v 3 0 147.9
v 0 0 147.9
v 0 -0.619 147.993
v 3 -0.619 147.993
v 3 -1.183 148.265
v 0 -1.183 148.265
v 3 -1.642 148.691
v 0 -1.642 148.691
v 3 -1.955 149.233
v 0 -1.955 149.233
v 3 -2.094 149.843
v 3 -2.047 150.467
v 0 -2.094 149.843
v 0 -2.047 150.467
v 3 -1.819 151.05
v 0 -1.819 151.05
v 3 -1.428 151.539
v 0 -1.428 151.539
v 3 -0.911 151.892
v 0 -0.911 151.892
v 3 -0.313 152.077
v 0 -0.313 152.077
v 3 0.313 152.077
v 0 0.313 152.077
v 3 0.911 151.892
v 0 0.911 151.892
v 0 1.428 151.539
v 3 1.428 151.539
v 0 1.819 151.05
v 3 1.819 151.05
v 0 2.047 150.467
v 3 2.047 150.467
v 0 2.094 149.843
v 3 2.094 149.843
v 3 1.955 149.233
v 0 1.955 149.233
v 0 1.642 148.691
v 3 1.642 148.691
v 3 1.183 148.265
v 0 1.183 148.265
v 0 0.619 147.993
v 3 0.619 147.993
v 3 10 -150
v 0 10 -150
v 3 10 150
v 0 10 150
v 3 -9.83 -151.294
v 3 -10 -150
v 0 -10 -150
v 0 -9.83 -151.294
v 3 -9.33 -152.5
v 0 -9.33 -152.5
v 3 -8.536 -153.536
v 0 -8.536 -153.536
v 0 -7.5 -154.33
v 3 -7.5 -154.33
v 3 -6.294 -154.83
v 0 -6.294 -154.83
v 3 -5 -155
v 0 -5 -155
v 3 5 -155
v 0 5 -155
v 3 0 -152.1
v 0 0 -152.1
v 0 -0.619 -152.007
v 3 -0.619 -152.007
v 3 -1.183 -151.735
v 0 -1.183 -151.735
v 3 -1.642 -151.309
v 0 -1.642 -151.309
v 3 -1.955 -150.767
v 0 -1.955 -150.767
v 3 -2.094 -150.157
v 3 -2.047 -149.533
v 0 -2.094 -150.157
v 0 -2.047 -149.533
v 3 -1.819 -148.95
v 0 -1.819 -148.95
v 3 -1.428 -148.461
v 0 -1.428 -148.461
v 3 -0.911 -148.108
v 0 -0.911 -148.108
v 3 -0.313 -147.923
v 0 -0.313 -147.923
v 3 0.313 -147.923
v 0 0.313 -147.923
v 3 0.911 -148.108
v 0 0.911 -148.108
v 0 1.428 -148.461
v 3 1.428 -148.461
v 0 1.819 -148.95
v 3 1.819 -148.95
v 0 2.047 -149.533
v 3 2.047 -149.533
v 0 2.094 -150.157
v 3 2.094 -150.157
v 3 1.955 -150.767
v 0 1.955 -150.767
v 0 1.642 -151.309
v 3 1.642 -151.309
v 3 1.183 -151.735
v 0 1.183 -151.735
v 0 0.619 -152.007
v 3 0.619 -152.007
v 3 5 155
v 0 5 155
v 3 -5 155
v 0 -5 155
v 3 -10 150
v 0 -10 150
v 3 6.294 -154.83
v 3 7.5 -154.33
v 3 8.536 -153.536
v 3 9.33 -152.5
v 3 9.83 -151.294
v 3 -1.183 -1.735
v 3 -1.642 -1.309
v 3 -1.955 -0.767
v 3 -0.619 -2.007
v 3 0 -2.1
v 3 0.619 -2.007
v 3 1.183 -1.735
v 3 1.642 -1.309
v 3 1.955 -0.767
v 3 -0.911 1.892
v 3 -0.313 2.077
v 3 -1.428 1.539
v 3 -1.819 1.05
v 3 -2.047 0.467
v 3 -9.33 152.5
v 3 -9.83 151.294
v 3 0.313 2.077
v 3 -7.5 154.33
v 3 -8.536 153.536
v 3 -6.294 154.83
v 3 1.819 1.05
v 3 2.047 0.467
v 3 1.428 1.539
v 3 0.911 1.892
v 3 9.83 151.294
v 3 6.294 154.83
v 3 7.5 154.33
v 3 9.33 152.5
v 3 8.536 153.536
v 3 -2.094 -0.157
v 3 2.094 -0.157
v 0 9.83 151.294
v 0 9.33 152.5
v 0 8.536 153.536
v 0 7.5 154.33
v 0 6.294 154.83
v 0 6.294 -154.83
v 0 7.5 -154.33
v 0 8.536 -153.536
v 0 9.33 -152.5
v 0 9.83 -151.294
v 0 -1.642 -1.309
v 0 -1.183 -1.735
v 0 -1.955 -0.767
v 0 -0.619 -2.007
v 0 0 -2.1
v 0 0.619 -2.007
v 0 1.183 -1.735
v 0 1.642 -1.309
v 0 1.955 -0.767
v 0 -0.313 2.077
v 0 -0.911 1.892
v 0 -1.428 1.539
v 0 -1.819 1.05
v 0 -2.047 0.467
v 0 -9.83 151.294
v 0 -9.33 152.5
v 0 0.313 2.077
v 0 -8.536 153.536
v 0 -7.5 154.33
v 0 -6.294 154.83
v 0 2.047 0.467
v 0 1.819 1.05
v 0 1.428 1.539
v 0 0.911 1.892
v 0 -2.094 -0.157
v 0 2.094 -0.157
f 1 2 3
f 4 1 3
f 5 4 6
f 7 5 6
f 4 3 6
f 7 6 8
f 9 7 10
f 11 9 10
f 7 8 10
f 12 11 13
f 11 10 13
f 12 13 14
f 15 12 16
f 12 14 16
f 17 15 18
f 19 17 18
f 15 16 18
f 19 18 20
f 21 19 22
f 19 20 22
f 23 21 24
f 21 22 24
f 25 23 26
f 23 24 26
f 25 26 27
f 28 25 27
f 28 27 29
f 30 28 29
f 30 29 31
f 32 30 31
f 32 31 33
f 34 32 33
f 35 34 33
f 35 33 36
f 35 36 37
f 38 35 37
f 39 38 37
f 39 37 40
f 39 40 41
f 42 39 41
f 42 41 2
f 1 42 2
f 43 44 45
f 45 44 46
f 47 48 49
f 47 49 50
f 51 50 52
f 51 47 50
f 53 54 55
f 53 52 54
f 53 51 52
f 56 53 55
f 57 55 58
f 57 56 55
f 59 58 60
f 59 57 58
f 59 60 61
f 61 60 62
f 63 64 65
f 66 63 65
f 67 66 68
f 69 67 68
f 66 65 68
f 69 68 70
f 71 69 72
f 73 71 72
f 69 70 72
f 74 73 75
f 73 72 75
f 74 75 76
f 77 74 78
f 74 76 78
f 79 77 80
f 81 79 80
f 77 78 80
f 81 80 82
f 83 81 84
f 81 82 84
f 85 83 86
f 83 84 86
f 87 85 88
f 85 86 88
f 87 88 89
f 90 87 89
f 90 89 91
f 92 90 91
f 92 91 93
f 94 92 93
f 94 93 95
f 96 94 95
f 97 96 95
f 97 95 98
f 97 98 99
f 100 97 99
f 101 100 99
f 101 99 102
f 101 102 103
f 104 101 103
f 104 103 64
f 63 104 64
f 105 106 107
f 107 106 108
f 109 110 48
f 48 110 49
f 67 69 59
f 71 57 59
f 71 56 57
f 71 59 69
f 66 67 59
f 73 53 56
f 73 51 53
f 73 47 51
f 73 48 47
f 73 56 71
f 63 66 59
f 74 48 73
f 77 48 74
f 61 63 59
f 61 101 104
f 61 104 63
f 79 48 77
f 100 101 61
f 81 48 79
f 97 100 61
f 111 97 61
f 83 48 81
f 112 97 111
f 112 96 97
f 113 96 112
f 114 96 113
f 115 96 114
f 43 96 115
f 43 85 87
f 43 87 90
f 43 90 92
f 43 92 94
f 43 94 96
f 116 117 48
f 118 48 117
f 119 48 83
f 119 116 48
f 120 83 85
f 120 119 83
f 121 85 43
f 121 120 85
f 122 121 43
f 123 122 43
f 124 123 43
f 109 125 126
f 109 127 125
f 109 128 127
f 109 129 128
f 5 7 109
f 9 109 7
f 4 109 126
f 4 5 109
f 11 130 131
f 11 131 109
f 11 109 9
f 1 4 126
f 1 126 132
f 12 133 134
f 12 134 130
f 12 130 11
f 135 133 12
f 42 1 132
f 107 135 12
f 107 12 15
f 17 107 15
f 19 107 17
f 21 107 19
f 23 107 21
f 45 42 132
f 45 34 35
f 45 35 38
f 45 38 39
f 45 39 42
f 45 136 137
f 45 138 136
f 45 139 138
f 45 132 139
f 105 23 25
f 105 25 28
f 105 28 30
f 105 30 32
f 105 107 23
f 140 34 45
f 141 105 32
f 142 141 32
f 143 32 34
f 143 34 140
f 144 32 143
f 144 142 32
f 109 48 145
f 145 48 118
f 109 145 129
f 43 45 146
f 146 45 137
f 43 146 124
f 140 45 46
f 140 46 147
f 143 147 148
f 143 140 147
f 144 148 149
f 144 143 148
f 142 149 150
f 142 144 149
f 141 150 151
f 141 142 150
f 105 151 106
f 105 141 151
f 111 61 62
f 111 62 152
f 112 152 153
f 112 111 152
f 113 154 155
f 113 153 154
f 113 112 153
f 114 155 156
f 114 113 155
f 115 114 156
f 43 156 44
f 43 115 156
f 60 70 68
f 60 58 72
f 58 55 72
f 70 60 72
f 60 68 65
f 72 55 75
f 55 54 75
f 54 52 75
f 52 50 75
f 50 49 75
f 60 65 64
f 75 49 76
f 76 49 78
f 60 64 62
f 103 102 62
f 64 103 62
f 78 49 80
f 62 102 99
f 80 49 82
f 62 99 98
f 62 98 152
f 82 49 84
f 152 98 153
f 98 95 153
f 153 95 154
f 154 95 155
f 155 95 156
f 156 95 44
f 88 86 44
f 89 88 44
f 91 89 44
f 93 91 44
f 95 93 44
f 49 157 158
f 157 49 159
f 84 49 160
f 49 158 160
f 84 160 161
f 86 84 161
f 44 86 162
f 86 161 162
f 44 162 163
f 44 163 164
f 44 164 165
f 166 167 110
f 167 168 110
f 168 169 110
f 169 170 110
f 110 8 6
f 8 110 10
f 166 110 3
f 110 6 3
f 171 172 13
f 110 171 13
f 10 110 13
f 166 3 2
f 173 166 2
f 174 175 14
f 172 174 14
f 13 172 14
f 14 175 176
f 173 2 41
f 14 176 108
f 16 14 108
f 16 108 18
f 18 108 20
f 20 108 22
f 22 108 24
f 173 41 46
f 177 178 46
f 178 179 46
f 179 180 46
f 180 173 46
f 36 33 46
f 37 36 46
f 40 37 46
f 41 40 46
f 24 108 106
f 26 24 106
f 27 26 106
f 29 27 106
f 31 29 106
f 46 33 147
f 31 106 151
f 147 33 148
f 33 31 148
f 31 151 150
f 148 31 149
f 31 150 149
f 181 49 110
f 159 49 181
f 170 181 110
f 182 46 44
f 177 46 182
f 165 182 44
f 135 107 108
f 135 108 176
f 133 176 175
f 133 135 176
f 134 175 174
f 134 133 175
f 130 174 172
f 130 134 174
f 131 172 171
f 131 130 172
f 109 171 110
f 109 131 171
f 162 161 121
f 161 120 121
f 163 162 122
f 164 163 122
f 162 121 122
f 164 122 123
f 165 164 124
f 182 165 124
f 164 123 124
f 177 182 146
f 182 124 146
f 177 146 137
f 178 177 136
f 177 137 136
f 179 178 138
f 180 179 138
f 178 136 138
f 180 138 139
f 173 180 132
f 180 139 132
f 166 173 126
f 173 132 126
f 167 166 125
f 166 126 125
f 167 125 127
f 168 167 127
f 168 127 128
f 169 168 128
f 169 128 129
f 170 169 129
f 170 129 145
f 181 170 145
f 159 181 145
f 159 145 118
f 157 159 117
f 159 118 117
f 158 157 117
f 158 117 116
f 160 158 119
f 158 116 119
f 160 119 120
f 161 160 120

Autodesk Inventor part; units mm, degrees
ref_plane "YZ Plane" through (0, 0, 0) normal (1, 0, 0) x (0, 1, 0)
ref_plane "XZ Plane" through (0, 0, 0) normal (0, 1, 0) x (-1, 0, 0)
ref_plane "XY Plane" through (0, 0, 0) normal (0, 0, 1) x (1, 0, 0)
sketch "스케치1" plane through (0, 0, 0) normal (1, 0, 0) x (0, 1, 0)
  line L0 (10, 155) -> (-10, 155)
  line L1 (-10, 155) -> (-10, -155)
  line L2 (-10, -155) -> (10, -155)
  line L3 (10, -155) -> (10, 155)
  point P0 (0, 0)
  dimension "d0" = 20
  dimension "d1" = 310
  dimension "d2" = 155
  dimension "d3" = 10
extrude "돌출1" add sketch "스케치1" along normal blind 3
sketch "스케치2" plane through (3, 0, 0) normal (1, 0, 0) x (0, 0, -1)
  line L0 (155, -10) -> (155, 10) construction
  line L1 (-155, -10) -> (155, -10) construction
  line L2 (155, 10) -> (-155, 10) construction
  line L3 (-155, 10) -> (-155, -10) construction
  line L4 (-155, -10) -> (155, -10) construction
  line L5 (155, -10) -> (155, 10) construction
  circle A0 centre (-150, 0) radius 10
  line L6 (0, 30.1702) -> (0, -32.7661) construction
  circle A1 centre (150, 0) radius 10
  dimension "d6" = 5
  dimension "d7" = 10
  dimension "d8" = 5
  dimension "d9" = 10
hole "구멍1" at (3, 0, -150) at (3, 0, 150) direction (-1, 0, 0) diameter 4.2 end through all
fillet "모깎기1" radius 5 4 edges at (1.5, 10, 155) (1.5, -10, 155) (1.5, -10, -155) (1.5, 10, -155)
sketch "스케치3" plane through (3, 0, 0) normal (1, 0, 0) x (0, 0, -1)
  circle A0 centre (0, 0) radius 2.1
  dimension "d18" = 4.2
extrude "돌출2" cut sketch "스케치3" against normal through all
equation "\"d2\" = 0.5 * d1"
equation "\"d3\" = 0.5 * d0"
properties part number "x바" material "PMMA 플라스틱"
